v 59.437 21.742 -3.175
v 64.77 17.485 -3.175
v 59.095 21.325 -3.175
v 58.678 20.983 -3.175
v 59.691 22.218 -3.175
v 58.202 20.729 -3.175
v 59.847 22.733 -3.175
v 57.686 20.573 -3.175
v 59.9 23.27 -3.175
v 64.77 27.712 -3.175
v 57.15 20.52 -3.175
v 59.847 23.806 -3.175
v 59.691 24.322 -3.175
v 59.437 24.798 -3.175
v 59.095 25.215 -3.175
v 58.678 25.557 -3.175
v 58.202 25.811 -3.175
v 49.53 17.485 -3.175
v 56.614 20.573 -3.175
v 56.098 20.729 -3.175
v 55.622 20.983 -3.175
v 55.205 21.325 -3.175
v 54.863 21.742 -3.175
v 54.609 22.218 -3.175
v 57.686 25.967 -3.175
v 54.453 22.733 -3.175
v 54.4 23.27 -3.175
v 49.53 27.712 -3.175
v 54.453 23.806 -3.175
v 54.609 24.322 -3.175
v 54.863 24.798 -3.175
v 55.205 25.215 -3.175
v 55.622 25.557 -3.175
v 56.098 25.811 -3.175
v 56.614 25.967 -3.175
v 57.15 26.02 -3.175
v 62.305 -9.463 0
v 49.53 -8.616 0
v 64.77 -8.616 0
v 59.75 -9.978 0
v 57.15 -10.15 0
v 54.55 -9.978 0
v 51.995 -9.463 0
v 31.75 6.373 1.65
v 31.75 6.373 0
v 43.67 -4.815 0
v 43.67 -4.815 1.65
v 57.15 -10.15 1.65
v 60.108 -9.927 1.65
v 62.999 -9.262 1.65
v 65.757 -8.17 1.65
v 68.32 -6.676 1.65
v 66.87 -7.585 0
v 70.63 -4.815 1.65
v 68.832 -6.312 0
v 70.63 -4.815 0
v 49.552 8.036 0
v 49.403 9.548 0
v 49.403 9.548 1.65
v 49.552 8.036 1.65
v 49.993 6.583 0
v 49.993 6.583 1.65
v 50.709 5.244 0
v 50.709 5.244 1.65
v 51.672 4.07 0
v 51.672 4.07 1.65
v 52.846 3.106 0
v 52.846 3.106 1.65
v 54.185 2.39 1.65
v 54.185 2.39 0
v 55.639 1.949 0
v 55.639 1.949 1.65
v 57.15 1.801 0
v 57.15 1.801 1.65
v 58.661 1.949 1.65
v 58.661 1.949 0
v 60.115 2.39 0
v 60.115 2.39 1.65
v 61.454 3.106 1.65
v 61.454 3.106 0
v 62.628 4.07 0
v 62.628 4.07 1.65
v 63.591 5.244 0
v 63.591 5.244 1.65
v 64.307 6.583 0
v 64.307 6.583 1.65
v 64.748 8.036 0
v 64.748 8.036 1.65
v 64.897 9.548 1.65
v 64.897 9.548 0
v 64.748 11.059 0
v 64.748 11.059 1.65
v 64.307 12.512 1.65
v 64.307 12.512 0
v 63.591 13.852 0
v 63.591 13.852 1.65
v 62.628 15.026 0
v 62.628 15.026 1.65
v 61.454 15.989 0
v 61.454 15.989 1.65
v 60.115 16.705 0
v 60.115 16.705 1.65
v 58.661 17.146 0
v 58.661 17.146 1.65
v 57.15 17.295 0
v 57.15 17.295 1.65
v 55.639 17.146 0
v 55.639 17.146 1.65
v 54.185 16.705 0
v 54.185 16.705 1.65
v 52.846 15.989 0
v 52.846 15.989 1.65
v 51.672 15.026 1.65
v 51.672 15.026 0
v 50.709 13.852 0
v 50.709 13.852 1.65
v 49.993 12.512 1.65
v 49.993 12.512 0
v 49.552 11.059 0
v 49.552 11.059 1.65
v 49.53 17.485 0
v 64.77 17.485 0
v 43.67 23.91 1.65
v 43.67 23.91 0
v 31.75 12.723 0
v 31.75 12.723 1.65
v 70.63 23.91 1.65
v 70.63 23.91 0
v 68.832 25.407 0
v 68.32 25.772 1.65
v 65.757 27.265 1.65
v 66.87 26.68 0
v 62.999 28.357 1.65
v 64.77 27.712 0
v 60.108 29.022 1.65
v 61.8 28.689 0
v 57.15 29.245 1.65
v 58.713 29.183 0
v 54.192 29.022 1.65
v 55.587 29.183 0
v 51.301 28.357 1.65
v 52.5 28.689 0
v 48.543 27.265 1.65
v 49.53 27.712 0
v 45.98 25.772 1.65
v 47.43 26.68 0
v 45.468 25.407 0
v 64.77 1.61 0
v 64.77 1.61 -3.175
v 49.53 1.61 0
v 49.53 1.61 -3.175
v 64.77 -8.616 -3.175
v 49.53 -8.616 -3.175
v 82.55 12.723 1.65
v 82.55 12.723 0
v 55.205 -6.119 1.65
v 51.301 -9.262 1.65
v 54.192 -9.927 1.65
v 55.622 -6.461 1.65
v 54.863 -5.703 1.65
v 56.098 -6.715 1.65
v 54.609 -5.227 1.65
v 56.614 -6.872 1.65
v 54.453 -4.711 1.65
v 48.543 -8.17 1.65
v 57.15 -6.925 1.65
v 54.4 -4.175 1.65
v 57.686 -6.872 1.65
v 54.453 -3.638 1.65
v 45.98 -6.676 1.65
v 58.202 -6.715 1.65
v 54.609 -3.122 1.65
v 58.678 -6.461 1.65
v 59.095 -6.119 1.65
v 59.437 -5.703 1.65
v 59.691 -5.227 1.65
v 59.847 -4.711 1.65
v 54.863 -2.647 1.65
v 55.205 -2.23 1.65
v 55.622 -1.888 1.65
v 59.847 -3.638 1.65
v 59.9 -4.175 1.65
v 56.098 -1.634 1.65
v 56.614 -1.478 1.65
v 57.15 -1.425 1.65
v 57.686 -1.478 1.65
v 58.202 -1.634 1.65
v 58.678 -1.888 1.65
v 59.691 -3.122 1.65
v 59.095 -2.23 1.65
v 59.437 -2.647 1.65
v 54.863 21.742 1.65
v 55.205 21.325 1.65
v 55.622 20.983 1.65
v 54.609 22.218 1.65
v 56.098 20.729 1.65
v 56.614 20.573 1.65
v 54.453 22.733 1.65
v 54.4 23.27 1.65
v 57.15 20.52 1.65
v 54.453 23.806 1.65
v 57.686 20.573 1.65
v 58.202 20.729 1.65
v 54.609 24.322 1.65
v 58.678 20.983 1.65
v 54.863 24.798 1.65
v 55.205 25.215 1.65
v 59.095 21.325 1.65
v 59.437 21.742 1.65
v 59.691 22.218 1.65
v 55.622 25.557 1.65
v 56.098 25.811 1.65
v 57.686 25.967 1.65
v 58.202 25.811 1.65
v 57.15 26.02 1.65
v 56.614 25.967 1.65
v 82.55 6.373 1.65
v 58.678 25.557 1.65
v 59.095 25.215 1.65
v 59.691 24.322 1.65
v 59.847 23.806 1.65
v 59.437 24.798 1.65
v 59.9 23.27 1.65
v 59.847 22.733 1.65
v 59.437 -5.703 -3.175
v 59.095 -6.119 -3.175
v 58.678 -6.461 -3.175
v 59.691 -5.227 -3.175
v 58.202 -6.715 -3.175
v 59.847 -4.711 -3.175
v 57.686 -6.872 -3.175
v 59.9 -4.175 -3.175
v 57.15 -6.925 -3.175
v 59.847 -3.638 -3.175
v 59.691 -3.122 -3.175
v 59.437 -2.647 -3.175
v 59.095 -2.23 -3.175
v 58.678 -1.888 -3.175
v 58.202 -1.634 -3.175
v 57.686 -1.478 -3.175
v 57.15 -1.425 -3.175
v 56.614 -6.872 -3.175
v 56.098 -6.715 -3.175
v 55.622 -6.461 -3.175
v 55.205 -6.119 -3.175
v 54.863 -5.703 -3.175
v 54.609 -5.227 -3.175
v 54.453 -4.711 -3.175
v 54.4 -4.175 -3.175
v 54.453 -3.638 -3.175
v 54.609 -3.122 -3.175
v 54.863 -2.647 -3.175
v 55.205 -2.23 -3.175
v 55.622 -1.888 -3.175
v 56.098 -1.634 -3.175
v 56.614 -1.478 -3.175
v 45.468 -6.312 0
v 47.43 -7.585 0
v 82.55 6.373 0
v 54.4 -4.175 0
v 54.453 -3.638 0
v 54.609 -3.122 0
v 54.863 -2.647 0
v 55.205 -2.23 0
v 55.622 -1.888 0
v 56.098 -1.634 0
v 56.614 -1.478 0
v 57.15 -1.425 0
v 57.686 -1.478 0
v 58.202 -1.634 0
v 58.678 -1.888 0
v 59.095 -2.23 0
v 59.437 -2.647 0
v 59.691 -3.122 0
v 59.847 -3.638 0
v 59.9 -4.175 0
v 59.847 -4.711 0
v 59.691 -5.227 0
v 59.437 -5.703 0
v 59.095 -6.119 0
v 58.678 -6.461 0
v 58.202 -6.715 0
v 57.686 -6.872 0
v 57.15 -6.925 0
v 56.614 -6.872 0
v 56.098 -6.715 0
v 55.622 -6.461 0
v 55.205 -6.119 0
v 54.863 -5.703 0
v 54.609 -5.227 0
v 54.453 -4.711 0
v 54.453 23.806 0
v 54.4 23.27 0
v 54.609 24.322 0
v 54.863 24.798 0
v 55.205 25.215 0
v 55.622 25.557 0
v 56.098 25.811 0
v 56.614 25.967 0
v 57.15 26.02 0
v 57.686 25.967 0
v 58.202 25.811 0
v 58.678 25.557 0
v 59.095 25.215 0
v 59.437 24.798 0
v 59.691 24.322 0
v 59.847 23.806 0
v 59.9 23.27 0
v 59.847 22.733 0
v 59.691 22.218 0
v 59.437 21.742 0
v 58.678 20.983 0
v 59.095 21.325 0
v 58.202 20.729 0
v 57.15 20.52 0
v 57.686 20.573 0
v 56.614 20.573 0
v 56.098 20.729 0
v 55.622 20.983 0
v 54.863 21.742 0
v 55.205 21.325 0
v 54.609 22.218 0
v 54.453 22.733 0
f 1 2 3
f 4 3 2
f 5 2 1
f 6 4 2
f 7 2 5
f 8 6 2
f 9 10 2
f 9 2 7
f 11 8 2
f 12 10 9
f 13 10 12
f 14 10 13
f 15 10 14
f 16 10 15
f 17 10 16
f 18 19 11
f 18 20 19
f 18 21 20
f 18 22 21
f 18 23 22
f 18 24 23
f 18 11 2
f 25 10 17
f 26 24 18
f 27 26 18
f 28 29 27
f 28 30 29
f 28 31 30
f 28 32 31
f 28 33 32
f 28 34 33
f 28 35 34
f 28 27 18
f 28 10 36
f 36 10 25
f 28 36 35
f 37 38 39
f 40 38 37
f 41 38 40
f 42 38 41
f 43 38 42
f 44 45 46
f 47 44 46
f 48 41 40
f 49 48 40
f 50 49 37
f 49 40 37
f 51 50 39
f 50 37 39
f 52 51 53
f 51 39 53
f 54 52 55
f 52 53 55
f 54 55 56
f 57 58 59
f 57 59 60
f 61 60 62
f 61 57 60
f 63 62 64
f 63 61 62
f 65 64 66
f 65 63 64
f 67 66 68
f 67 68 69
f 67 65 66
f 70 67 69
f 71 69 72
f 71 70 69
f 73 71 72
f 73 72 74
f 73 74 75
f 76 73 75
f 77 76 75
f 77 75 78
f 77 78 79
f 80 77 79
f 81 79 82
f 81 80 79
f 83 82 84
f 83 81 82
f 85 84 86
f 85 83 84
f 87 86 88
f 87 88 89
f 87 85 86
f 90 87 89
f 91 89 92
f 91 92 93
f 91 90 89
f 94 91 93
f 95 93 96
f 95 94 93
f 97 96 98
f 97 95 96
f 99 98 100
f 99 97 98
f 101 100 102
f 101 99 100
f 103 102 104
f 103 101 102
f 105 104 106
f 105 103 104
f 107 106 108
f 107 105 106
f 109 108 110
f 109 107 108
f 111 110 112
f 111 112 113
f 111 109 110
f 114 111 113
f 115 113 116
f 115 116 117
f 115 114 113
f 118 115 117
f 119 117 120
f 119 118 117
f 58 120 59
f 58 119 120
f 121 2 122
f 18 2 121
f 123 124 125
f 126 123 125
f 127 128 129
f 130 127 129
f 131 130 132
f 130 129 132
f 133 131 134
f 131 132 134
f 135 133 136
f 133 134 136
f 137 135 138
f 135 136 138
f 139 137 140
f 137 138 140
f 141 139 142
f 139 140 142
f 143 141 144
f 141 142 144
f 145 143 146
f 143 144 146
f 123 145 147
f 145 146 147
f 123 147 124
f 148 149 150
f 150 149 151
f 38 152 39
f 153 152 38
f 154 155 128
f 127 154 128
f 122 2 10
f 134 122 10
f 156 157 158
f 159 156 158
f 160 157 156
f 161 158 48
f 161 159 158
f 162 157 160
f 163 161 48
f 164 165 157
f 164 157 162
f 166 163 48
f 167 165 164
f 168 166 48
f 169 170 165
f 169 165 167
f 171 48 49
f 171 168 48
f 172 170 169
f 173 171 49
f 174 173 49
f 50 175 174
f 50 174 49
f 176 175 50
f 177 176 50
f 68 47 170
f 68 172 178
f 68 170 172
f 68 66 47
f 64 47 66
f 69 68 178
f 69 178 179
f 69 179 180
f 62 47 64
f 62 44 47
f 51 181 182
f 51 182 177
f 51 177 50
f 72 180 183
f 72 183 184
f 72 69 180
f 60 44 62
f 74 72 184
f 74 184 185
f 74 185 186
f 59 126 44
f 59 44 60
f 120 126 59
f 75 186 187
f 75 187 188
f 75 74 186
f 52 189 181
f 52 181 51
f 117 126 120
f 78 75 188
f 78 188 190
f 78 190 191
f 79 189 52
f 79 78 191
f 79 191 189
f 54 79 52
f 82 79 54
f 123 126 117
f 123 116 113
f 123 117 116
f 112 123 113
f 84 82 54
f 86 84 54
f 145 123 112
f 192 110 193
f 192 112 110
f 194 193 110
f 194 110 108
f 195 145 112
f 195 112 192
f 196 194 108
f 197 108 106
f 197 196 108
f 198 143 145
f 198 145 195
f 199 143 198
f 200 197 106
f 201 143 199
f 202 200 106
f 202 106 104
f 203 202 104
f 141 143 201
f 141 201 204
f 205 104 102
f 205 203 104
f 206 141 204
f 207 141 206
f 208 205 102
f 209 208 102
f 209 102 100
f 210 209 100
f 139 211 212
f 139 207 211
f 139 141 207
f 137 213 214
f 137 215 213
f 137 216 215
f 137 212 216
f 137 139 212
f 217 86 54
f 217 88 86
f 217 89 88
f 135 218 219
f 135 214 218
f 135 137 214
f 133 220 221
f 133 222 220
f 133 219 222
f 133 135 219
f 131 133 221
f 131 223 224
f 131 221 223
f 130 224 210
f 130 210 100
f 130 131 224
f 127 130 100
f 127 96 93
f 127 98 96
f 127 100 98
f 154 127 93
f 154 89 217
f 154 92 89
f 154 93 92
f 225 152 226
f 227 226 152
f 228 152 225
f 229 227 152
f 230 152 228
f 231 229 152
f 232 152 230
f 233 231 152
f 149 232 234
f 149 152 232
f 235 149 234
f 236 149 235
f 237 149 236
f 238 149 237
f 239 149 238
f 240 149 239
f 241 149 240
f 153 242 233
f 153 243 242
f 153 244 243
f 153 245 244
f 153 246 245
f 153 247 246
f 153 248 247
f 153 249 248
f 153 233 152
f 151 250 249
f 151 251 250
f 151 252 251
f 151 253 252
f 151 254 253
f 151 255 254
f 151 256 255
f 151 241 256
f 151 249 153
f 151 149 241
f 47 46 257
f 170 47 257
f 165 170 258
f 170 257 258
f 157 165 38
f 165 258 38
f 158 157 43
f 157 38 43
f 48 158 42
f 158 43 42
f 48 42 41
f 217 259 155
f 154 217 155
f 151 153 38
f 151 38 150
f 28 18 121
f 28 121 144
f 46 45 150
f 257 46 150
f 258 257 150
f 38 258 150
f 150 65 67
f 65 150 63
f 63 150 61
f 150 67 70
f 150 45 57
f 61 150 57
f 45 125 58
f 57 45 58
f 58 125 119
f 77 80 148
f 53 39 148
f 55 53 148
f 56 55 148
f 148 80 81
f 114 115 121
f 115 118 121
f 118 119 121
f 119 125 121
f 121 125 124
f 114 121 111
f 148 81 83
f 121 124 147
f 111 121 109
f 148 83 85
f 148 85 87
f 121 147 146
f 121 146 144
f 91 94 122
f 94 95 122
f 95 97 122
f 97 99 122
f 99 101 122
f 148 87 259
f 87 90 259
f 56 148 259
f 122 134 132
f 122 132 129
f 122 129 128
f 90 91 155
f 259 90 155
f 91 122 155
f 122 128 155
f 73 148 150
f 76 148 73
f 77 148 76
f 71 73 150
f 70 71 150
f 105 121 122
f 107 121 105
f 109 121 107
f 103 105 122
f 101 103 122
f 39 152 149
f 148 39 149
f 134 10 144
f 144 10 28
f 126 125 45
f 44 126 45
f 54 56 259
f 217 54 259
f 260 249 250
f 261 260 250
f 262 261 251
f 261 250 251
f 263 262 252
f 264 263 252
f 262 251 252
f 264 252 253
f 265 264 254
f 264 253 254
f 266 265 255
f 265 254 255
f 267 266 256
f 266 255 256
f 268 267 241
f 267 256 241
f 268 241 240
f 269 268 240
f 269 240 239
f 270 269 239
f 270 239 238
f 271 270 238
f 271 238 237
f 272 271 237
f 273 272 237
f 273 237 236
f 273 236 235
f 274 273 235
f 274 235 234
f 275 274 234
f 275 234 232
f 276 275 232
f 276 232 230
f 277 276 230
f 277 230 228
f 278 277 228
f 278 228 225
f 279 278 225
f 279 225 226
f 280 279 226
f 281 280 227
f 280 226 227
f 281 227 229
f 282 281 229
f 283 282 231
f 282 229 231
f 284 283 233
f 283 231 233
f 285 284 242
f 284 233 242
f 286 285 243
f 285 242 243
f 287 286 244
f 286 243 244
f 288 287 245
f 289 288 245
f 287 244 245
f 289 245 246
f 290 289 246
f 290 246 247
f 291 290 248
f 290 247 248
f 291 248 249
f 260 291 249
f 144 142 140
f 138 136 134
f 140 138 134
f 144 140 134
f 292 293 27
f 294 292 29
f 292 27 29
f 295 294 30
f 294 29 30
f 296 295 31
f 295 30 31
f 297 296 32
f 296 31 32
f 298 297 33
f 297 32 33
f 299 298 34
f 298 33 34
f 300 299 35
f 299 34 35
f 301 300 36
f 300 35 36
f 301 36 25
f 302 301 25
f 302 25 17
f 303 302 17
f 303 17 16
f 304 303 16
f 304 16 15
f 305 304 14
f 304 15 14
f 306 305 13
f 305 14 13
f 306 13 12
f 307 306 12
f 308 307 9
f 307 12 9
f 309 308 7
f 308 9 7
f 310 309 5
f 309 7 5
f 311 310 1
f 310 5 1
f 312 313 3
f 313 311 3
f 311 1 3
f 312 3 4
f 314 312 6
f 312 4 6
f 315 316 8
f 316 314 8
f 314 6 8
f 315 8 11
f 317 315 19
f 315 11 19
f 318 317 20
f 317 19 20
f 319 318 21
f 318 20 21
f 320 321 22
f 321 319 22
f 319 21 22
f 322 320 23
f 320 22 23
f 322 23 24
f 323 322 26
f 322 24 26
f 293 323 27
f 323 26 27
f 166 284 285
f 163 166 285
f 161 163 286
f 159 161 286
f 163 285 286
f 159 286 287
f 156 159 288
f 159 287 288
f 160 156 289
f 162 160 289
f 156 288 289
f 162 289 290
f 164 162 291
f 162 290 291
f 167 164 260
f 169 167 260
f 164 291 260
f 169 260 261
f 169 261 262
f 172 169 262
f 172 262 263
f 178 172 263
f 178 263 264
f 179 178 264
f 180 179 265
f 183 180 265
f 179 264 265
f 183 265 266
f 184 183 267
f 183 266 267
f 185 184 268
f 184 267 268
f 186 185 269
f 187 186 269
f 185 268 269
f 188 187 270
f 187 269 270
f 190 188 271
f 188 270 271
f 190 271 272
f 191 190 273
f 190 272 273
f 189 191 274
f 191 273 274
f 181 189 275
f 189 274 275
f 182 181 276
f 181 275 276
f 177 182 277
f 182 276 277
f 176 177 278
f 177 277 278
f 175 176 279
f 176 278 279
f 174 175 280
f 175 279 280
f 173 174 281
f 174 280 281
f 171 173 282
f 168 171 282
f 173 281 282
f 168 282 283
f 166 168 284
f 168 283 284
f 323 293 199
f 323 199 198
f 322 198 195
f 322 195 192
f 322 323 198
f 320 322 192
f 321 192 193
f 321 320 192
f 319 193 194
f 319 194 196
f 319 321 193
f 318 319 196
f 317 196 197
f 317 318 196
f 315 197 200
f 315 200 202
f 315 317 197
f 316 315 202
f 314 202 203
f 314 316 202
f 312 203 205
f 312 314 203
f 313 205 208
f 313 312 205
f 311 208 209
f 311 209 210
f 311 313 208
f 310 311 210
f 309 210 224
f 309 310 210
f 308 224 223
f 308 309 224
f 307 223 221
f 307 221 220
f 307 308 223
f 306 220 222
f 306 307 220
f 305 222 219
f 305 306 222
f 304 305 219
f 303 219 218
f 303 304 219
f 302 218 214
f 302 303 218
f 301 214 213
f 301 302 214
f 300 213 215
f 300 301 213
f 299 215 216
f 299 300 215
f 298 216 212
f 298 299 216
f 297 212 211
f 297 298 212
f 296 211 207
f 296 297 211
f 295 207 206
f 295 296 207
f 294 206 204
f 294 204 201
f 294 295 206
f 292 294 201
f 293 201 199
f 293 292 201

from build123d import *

# Parameters (mm, degrees)
SKETCH1_R           = 7.747
SKETCH1_R_2         = 2.75
BOSS_EXTRUDE1_DEPTH = 1.65
BOSS_EXTRUDE3_START = 3.175
SKETCH2_W           = 15.24
SKETCH2_H           = 10.22657696
SKETCH2_R           = 2.75
BOSS_EXTRUDE3_DEPTH = 3.175


with BuildPart() as part:
    # Sketch1 → Boss-Extrude1 (new body)
    with BuildSketch(Plane.XY):
        with BuildLine():
            Line((43.669801091, 23.910175431), (31.75, 12.722643302))
            Line((31.75, 12.722643302), (31.75, 6.372643302))
            Line((31.75, 6.372643302), (43.669801091, -4.814888828))
            ThreePointArc((43.669801091, -4.814888828), (49.901216852, -8.767739159), (57.15, -10.150023865))
            ThreePointArc((57.15, -10.150023865), (64.398783148, -8.767739159), (70.630198909, -4.814888828))
            Line((70.630198909, -4.814888828), (82.55, 6.372643302))
            Line((82.55, 6.372643302), (82.55, 12.722643302))
            Line((82.55, 12.722643302), (70.630198909, 23.910175431))
            ThreePointArc((70.630198909, 23.910175431), (57.15, 29.245310468), (43.669801091, 23.910175431))
        make_face()
        with BuildLine():
            ThreePointArc((57.15, -1.424690282), (59.9, -4.174690282), (57.15, -6.924690282))
            ThreePointArc((57.15, -6.924690282), (54.4, -4.174690282), (57.15, -1.424690282))
        make_face(mode=Mode.SUBTRACT)
        with Locations(Location((57.15, 9.547643302, 0), (0, 0, 180))):
            Circle(SKETCH1_R, mode=Mode.SUBTRACT)
        with Locations(Location((57.15, 23.269976885, 0), (0, 0, 180))):
            Circle(SKETCH1_R_2, mode=Mode.SUBTRACT)
    extrude(amount=BOSS_EXTRUDE1_DEPTH)

    # Sketch2 → Boss-Extrude3 (add)
    # profile 1 of 2: a face of its own
    with BuildSketch(Plane(origin=(0, 0, 0), x_dir=(-1, 0, 0), z_dir=(0, 0, -1)).offset(BOSS_EXTRUDE3_START)):
        with Locations((-57.15, 22.598431782)):
            Rectangle(SKETCH2_W, SKETCH2_H)
        with Locations((-57.15, 23.269976885)):
            Circle(SKETCH2_R, mode=Mode.SUBTRACT)
    # profile 2 of 2: a face of its own
    with BuildSketch(Plane(origin=(0, 0, 0), x_dir=(-1, 0, 0), z_dir=(0, 0, -1)).offset(BOSS_EXTRUDE3_START)):
        with Locations((-57.15, -3.503145178)):
            Rectangle(SKETCH2_W, SKETCH2_H)
        with Locations((-57.15, -4.174690282)):
            Circle(SKETCH2_R, mode=Mode.SUBTRACT)
    extrude(amount=-BOSS_EXTRUDE3_DEPTH)


solid = part.part
